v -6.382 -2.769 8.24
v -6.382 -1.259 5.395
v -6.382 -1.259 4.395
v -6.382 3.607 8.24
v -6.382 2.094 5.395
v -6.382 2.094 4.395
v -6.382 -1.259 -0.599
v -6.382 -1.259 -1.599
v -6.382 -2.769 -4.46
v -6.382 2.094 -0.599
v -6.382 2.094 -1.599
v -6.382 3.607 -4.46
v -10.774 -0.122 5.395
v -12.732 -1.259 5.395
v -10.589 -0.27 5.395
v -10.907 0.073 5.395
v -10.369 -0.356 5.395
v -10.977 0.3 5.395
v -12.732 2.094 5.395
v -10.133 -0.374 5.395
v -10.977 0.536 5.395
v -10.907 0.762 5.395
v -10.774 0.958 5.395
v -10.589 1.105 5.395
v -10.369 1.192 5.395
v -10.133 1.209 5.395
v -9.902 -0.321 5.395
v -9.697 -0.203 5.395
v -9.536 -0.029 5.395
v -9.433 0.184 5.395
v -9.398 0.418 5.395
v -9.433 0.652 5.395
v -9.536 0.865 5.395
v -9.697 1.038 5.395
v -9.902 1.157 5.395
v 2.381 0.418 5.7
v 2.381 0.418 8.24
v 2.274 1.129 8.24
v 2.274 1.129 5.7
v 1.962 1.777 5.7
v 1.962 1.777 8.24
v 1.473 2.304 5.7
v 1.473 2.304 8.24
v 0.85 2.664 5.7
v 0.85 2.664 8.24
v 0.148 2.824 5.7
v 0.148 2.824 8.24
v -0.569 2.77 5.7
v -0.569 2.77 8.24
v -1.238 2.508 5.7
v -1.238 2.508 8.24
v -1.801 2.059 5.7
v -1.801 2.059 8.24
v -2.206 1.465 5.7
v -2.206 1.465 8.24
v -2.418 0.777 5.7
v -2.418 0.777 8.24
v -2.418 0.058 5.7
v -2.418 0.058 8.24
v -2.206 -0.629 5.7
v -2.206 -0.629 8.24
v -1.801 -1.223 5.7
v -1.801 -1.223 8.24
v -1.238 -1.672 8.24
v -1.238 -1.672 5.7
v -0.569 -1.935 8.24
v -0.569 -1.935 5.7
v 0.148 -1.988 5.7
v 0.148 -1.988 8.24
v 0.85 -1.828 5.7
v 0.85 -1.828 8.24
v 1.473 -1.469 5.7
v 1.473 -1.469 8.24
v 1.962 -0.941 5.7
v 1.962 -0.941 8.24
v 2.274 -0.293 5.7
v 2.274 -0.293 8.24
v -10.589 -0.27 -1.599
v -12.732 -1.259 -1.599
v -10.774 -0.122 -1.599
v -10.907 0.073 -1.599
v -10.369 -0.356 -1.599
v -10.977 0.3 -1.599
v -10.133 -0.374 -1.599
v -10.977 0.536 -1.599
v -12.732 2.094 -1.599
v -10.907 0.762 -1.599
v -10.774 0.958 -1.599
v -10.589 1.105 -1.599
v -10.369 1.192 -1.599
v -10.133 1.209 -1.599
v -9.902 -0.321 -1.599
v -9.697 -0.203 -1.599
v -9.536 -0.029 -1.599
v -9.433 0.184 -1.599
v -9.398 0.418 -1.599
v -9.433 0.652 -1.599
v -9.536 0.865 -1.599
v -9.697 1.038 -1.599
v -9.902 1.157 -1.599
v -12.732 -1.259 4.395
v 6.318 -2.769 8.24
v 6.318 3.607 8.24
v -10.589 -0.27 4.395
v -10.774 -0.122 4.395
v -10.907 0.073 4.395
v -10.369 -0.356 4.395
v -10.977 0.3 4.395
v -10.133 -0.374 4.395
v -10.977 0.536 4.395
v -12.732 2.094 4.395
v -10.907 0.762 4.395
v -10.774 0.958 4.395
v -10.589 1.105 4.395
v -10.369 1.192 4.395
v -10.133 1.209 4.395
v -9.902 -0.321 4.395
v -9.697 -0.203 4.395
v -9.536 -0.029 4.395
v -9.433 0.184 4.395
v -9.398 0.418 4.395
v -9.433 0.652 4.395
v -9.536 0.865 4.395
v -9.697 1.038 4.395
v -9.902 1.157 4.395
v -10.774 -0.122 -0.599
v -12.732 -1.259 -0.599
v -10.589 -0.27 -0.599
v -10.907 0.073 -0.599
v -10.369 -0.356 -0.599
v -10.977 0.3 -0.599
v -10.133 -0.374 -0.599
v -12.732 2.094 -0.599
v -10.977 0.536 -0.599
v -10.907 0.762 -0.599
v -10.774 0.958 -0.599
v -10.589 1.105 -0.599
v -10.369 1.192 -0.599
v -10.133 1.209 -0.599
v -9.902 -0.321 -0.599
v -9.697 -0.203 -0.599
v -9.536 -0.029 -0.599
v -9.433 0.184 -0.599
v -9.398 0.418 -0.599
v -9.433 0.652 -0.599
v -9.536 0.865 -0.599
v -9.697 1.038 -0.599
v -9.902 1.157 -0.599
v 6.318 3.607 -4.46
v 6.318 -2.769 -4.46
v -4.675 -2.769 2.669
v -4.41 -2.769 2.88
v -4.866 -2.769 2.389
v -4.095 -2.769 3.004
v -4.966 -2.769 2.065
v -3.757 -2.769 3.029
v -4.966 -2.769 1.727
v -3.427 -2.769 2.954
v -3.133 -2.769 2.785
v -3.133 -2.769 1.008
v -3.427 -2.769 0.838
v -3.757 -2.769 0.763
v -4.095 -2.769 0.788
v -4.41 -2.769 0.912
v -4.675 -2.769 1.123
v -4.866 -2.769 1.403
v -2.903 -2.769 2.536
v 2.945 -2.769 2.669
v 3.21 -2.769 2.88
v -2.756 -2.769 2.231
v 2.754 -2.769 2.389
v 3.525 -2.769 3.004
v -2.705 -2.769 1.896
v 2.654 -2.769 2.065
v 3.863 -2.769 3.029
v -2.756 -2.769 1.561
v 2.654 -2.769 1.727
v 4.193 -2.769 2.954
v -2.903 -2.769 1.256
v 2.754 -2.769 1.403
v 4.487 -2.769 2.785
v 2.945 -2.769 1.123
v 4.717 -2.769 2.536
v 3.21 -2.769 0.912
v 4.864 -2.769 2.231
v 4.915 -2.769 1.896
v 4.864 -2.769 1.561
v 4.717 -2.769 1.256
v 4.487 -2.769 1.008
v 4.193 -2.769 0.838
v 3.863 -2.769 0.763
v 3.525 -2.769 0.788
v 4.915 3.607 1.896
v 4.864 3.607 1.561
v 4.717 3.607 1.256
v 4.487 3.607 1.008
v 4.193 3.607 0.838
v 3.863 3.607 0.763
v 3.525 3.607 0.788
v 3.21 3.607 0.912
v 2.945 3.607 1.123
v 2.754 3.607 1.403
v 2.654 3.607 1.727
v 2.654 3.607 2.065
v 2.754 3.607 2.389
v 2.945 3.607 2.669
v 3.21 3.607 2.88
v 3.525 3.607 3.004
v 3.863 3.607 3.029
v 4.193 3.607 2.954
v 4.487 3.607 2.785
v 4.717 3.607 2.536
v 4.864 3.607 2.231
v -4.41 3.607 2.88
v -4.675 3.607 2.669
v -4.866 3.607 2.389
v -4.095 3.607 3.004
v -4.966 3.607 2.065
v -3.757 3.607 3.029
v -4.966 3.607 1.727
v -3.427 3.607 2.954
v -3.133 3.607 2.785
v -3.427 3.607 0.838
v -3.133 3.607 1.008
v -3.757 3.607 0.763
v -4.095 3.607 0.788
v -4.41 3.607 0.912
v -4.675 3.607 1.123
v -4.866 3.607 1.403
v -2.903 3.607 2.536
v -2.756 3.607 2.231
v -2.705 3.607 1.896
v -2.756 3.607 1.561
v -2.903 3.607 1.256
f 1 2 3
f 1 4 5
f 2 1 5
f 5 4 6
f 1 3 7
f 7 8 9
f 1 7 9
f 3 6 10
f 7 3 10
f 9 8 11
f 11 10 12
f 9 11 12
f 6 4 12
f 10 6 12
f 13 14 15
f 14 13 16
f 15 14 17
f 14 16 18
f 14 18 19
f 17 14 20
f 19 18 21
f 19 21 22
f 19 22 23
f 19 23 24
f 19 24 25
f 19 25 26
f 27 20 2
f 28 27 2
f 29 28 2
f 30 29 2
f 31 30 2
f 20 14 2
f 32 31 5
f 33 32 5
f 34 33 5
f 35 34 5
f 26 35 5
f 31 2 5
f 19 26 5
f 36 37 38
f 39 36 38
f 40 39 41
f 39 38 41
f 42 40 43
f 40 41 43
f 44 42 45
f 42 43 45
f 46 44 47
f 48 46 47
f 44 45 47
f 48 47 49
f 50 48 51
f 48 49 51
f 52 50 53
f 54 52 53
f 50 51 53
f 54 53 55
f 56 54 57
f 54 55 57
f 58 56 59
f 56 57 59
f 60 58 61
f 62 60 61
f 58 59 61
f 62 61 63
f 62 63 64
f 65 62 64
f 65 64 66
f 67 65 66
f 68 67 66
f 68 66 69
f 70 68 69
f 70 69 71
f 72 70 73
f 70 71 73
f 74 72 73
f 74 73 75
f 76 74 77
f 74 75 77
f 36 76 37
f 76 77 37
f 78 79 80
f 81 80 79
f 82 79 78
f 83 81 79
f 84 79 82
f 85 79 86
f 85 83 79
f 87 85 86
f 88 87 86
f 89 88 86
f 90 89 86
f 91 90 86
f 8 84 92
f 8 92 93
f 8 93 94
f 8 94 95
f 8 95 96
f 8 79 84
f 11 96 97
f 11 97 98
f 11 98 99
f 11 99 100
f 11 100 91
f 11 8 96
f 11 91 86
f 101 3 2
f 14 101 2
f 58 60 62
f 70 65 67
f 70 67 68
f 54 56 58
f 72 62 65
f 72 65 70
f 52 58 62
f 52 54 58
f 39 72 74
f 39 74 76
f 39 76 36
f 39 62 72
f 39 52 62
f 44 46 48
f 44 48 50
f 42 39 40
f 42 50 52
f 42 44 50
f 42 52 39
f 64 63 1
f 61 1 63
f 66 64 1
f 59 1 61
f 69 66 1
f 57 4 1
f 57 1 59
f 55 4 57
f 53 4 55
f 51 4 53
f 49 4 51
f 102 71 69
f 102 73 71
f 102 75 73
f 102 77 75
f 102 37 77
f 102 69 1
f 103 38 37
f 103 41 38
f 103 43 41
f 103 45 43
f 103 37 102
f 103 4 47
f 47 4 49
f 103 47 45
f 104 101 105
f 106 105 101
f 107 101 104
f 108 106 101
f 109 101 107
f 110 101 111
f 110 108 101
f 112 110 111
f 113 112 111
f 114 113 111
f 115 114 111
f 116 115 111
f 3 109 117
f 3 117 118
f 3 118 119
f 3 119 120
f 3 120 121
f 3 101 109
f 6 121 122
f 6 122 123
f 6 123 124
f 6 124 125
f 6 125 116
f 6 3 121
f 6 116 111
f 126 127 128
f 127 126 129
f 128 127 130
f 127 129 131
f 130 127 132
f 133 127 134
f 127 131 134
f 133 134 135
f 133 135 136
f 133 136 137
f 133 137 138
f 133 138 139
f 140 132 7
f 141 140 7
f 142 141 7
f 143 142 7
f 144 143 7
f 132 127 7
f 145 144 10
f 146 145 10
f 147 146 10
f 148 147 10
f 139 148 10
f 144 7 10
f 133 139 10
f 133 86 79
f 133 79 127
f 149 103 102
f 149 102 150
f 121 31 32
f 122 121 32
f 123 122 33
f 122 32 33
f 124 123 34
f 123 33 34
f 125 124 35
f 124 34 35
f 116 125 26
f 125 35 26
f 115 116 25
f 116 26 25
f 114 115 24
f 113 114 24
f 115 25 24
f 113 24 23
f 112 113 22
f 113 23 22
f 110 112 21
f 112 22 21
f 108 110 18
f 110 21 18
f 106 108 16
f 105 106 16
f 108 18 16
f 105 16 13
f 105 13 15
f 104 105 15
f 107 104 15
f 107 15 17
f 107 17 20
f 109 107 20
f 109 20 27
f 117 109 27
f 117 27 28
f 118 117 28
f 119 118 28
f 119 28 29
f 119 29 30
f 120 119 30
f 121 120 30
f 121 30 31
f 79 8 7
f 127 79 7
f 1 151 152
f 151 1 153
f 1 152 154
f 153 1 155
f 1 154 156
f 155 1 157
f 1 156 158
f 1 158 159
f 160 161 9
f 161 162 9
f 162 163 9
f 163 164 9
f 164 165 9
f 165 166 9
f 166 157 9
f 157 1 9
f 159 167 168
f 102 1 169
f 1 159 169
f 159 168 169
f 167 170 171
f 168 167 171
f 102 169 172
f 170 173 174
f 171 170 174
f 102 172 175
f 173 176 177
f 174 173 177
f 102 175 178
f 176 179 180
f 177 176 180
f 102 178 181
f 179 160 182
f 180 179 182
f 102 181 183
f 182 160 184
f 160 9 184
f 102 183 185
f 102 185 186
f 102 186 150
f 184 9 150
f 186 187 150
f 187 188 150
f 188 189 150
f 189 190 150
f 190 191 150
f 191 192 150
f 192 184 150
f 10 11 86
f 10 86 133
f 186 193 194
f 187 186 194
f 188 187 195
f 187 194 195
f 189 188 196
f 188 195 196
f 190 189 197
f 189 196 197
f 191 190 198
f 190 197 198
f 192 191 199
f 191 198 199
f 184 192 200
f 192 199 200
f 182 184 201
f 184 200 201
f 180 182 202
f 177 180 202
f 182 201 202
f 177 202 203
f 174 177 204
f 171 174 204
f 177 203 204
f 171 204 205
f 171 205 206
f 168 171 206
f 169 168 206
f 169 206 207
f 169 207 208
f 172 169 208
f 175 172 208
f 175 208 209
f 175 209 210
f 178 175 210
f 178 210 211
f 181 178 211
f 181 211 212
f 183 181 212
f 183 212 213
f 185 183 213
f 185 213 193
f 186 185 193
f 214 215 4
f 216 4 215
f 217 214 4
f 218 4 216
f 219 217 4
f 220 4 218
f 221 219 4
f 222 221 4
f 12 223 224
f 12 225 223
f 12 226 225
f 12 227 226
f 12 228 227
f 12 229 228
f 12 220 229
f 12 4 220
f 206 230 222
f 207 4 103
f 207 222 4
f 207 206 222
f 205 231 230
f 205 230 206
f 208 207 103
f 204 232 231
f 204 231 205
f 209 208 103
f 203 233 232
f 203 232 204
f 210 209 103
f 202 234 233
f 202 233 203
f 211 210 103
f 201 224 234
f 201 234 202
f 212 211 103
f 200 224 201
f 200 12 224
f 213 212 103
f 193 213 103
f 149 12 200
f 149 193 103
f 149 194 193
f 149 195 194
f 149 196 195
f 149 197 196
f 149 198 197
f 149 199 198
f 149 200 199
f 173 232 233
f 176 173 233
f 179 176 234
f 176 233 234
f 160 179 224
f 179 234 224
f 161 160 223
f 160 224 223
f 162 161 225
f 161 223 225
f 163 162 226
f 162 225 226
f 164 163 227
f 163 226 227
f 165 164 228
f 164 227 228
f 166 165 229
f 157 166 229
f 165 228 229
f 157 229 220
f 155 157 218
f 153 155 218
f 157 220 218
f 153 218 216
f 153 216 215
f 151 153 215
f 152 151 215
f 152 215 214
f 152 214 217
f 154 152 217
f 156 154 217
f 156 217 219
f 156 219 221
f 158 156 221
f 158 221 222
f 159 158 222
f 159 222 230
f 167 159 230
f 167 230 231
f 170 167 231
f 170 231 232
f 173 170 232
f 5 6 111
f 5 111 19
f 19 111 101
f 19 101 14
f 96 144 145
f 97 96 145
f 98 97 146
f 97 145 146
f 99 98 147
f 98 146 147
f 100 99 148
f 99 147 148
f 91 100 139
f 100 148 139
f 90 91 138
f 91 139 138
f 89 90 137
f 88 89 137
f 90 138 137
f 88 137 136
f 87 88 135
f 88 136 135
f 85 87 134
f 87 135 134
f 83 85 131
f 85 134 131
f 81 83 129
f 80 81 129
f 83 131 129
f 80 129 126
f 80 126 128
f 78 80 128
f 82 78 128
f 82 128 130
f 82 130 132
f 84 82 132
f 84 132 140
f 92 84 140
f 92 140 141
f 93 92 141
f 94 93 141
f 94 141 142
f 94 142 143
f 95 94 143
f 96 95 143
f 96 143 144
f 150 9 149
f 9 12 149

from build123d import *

# Parameters (mm, degrees)
SKETCH2_W                = 12.7
SKETCH2_H                = 12.7
BOSS_EXTRUDE4_DEPTH      = 3.6068
BOSS_EXTRUDE4_DEPTH_BACK = 2.7686
SKETCH3_W                = 1.000000006
SKETCH3_H                = 3.352800001
BOSS_EXTRUDE5_DEPTH      = 6.35
SKETCH4_R                = 0.79375
CUT_EXTRUDE1_DEPTH       = 10.854800007
SKETCH5_R                = 2.413000001
CUT_EXTRUDE2_DEPTH       = 2.54
SKETCH7_R                = 1.136382046
CUT_EXTRUDE4_DEPTH       = 7.3754


with BuildPart() as part:
    # Sketch2 → Boss-Extrude4 (new body, two sides)
    with BuildSketch(Plane(origin=(0, 0, 0), x_dir=(1, 0, 0), z_dir=(0, 1, 0))) as boss_extrude4_sk:
        with Locations((-0.031876663, -1.889989023)):
            Rectangle(SKETCH2_W, SKETCH2_H)
    extrude(amount=BOSS_EXTRUDE4_DEPTH)
    extrude(boss_extrude4_sk.sketch, amount=-BOSS_EXTRUDE4_DEPTH_BACK)

    # Sketch3 → Boss-Extrude5 (add)
    with BuildSketch(Plane.ZY.offset(6.381876663)):
        with Locations((-1.098810974, 0.417848354)):
            Rectangle(SKETCH3_W, SKETCH3_H)
        with Locations((4.894789026, 0.417848354)):
            Rectangle(SKETCH3_W, SKETCH3_H)
    extrude(amount=BOSS_EXTRUDE5_DEPTH)

    # Sketch4 → Cut-Extrude1 (cut, through all)
    with BuildSketch(Plane.XY.offset(5.394789029)):
        with Locations((-10.191876663, 0.417848354)):
            Circle(SKETCH4_R)
    extrude(amount=-CUT_EXTRUDE1_DEPTH, mode=Mode.SUBTRACT)

    # Sketch5 → Cut-Extrude2 (cut)
    with BuildSketch(Plane.XY.offset(8.239989023)):
        with Locations((-0.031876663, 0.417848354)):
            Circle(SKETCH5_R)
    extrude(amount=-CUT_EXTRUDE2_DEPTH, mode=Mode.SUBTRACT)

    # Sketch7 → Cut-Extrude4 (cut, through all)
    with BuildSketch(Plane(origin=(0, 3.6068, 0), x_dir=(1, 0, 0), z_dir=(0, 1, 0))):
        with Locations((-3.841876663, -1.89607107)):
            Circle(SKETCH7_R)
        with Locations((3.778123337, -1.89607107)):
            Circle(SKETCH7_R)
    extrude(amount=-CUT_EXTRUDE4_DEPTH, mode=Mode.SUBTRACT)


solid = part.part
